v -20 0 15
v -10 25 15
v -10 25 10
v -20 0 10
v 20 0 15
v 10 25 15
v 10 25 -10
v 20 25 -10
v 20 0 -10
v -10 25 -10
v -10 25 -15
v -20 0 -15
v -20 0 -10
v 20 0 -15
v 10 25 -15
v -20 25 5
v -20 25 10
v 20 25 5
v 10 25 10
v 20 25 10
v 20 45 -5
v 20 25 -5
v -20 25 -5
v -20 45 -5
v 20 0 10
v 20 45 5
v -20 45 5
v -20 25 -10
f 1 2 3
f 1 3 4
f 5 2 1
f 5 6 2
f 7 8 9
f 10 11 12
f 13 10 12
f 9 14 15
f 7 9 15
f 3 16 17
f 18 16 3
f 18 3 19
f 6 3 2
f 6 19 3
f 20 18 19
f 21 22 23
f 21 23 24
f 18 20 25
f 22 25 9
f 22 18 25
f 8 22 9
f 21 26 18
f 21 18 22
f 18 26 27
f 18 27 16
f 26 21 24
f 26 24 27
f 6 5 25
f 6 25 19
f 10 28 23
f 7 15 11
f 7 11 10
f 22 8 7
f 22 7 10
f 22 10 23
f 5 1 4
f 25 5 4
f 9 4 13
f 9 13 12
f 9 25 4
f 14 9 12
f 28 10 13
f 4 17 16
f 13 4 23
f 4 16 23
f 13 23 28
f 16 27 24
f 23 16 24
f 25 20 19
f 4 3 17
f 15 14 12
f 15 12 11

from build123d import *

# Parameters (mm, degrees)
SALIENTE_EXTRUIR1_DEPTH = 20
CORTAR_EXTRUIR1_DEPTH   = 5


with BuildPart() as part:
    # Croquis1 → Saliente-Extruir1 (new, symmetric)
    with BuildSketch(Plane(origin=(0, 0, 0), x_dir=(0, 0, -1), z_dir=(1, 0, 0))):
        Polygon((-15, 0), (15, 0), (15, 25), (5, 25), (5, 45), (-5, 45), (-5, 25), (-15, 25), align=None)
    extrude(amount=SALIENTE_EXTRUIR1_DEPTH, both=True)

    # Croquis3 → Cortar-Extruir1 (cut)
    with BuildSketch(Plane.XY.offset(15)):
        Polygon((-20, 25), (-10, 25), (-20, 0), align=None)
        Polygon((10, 25), (20, 25), (20, 0), align=None)
    cortar_extruir1 = extrude(amount=-CORTAR_EXTRUIR1_DEPTH, mode=Mode.SUBTRACT)

    # Simetría1: Cortar-Extruir1 across plane
    add(cortar_extruir1.mirror(Plane.XY), mode=Mode.SUBTRACT)


solid = part.part
